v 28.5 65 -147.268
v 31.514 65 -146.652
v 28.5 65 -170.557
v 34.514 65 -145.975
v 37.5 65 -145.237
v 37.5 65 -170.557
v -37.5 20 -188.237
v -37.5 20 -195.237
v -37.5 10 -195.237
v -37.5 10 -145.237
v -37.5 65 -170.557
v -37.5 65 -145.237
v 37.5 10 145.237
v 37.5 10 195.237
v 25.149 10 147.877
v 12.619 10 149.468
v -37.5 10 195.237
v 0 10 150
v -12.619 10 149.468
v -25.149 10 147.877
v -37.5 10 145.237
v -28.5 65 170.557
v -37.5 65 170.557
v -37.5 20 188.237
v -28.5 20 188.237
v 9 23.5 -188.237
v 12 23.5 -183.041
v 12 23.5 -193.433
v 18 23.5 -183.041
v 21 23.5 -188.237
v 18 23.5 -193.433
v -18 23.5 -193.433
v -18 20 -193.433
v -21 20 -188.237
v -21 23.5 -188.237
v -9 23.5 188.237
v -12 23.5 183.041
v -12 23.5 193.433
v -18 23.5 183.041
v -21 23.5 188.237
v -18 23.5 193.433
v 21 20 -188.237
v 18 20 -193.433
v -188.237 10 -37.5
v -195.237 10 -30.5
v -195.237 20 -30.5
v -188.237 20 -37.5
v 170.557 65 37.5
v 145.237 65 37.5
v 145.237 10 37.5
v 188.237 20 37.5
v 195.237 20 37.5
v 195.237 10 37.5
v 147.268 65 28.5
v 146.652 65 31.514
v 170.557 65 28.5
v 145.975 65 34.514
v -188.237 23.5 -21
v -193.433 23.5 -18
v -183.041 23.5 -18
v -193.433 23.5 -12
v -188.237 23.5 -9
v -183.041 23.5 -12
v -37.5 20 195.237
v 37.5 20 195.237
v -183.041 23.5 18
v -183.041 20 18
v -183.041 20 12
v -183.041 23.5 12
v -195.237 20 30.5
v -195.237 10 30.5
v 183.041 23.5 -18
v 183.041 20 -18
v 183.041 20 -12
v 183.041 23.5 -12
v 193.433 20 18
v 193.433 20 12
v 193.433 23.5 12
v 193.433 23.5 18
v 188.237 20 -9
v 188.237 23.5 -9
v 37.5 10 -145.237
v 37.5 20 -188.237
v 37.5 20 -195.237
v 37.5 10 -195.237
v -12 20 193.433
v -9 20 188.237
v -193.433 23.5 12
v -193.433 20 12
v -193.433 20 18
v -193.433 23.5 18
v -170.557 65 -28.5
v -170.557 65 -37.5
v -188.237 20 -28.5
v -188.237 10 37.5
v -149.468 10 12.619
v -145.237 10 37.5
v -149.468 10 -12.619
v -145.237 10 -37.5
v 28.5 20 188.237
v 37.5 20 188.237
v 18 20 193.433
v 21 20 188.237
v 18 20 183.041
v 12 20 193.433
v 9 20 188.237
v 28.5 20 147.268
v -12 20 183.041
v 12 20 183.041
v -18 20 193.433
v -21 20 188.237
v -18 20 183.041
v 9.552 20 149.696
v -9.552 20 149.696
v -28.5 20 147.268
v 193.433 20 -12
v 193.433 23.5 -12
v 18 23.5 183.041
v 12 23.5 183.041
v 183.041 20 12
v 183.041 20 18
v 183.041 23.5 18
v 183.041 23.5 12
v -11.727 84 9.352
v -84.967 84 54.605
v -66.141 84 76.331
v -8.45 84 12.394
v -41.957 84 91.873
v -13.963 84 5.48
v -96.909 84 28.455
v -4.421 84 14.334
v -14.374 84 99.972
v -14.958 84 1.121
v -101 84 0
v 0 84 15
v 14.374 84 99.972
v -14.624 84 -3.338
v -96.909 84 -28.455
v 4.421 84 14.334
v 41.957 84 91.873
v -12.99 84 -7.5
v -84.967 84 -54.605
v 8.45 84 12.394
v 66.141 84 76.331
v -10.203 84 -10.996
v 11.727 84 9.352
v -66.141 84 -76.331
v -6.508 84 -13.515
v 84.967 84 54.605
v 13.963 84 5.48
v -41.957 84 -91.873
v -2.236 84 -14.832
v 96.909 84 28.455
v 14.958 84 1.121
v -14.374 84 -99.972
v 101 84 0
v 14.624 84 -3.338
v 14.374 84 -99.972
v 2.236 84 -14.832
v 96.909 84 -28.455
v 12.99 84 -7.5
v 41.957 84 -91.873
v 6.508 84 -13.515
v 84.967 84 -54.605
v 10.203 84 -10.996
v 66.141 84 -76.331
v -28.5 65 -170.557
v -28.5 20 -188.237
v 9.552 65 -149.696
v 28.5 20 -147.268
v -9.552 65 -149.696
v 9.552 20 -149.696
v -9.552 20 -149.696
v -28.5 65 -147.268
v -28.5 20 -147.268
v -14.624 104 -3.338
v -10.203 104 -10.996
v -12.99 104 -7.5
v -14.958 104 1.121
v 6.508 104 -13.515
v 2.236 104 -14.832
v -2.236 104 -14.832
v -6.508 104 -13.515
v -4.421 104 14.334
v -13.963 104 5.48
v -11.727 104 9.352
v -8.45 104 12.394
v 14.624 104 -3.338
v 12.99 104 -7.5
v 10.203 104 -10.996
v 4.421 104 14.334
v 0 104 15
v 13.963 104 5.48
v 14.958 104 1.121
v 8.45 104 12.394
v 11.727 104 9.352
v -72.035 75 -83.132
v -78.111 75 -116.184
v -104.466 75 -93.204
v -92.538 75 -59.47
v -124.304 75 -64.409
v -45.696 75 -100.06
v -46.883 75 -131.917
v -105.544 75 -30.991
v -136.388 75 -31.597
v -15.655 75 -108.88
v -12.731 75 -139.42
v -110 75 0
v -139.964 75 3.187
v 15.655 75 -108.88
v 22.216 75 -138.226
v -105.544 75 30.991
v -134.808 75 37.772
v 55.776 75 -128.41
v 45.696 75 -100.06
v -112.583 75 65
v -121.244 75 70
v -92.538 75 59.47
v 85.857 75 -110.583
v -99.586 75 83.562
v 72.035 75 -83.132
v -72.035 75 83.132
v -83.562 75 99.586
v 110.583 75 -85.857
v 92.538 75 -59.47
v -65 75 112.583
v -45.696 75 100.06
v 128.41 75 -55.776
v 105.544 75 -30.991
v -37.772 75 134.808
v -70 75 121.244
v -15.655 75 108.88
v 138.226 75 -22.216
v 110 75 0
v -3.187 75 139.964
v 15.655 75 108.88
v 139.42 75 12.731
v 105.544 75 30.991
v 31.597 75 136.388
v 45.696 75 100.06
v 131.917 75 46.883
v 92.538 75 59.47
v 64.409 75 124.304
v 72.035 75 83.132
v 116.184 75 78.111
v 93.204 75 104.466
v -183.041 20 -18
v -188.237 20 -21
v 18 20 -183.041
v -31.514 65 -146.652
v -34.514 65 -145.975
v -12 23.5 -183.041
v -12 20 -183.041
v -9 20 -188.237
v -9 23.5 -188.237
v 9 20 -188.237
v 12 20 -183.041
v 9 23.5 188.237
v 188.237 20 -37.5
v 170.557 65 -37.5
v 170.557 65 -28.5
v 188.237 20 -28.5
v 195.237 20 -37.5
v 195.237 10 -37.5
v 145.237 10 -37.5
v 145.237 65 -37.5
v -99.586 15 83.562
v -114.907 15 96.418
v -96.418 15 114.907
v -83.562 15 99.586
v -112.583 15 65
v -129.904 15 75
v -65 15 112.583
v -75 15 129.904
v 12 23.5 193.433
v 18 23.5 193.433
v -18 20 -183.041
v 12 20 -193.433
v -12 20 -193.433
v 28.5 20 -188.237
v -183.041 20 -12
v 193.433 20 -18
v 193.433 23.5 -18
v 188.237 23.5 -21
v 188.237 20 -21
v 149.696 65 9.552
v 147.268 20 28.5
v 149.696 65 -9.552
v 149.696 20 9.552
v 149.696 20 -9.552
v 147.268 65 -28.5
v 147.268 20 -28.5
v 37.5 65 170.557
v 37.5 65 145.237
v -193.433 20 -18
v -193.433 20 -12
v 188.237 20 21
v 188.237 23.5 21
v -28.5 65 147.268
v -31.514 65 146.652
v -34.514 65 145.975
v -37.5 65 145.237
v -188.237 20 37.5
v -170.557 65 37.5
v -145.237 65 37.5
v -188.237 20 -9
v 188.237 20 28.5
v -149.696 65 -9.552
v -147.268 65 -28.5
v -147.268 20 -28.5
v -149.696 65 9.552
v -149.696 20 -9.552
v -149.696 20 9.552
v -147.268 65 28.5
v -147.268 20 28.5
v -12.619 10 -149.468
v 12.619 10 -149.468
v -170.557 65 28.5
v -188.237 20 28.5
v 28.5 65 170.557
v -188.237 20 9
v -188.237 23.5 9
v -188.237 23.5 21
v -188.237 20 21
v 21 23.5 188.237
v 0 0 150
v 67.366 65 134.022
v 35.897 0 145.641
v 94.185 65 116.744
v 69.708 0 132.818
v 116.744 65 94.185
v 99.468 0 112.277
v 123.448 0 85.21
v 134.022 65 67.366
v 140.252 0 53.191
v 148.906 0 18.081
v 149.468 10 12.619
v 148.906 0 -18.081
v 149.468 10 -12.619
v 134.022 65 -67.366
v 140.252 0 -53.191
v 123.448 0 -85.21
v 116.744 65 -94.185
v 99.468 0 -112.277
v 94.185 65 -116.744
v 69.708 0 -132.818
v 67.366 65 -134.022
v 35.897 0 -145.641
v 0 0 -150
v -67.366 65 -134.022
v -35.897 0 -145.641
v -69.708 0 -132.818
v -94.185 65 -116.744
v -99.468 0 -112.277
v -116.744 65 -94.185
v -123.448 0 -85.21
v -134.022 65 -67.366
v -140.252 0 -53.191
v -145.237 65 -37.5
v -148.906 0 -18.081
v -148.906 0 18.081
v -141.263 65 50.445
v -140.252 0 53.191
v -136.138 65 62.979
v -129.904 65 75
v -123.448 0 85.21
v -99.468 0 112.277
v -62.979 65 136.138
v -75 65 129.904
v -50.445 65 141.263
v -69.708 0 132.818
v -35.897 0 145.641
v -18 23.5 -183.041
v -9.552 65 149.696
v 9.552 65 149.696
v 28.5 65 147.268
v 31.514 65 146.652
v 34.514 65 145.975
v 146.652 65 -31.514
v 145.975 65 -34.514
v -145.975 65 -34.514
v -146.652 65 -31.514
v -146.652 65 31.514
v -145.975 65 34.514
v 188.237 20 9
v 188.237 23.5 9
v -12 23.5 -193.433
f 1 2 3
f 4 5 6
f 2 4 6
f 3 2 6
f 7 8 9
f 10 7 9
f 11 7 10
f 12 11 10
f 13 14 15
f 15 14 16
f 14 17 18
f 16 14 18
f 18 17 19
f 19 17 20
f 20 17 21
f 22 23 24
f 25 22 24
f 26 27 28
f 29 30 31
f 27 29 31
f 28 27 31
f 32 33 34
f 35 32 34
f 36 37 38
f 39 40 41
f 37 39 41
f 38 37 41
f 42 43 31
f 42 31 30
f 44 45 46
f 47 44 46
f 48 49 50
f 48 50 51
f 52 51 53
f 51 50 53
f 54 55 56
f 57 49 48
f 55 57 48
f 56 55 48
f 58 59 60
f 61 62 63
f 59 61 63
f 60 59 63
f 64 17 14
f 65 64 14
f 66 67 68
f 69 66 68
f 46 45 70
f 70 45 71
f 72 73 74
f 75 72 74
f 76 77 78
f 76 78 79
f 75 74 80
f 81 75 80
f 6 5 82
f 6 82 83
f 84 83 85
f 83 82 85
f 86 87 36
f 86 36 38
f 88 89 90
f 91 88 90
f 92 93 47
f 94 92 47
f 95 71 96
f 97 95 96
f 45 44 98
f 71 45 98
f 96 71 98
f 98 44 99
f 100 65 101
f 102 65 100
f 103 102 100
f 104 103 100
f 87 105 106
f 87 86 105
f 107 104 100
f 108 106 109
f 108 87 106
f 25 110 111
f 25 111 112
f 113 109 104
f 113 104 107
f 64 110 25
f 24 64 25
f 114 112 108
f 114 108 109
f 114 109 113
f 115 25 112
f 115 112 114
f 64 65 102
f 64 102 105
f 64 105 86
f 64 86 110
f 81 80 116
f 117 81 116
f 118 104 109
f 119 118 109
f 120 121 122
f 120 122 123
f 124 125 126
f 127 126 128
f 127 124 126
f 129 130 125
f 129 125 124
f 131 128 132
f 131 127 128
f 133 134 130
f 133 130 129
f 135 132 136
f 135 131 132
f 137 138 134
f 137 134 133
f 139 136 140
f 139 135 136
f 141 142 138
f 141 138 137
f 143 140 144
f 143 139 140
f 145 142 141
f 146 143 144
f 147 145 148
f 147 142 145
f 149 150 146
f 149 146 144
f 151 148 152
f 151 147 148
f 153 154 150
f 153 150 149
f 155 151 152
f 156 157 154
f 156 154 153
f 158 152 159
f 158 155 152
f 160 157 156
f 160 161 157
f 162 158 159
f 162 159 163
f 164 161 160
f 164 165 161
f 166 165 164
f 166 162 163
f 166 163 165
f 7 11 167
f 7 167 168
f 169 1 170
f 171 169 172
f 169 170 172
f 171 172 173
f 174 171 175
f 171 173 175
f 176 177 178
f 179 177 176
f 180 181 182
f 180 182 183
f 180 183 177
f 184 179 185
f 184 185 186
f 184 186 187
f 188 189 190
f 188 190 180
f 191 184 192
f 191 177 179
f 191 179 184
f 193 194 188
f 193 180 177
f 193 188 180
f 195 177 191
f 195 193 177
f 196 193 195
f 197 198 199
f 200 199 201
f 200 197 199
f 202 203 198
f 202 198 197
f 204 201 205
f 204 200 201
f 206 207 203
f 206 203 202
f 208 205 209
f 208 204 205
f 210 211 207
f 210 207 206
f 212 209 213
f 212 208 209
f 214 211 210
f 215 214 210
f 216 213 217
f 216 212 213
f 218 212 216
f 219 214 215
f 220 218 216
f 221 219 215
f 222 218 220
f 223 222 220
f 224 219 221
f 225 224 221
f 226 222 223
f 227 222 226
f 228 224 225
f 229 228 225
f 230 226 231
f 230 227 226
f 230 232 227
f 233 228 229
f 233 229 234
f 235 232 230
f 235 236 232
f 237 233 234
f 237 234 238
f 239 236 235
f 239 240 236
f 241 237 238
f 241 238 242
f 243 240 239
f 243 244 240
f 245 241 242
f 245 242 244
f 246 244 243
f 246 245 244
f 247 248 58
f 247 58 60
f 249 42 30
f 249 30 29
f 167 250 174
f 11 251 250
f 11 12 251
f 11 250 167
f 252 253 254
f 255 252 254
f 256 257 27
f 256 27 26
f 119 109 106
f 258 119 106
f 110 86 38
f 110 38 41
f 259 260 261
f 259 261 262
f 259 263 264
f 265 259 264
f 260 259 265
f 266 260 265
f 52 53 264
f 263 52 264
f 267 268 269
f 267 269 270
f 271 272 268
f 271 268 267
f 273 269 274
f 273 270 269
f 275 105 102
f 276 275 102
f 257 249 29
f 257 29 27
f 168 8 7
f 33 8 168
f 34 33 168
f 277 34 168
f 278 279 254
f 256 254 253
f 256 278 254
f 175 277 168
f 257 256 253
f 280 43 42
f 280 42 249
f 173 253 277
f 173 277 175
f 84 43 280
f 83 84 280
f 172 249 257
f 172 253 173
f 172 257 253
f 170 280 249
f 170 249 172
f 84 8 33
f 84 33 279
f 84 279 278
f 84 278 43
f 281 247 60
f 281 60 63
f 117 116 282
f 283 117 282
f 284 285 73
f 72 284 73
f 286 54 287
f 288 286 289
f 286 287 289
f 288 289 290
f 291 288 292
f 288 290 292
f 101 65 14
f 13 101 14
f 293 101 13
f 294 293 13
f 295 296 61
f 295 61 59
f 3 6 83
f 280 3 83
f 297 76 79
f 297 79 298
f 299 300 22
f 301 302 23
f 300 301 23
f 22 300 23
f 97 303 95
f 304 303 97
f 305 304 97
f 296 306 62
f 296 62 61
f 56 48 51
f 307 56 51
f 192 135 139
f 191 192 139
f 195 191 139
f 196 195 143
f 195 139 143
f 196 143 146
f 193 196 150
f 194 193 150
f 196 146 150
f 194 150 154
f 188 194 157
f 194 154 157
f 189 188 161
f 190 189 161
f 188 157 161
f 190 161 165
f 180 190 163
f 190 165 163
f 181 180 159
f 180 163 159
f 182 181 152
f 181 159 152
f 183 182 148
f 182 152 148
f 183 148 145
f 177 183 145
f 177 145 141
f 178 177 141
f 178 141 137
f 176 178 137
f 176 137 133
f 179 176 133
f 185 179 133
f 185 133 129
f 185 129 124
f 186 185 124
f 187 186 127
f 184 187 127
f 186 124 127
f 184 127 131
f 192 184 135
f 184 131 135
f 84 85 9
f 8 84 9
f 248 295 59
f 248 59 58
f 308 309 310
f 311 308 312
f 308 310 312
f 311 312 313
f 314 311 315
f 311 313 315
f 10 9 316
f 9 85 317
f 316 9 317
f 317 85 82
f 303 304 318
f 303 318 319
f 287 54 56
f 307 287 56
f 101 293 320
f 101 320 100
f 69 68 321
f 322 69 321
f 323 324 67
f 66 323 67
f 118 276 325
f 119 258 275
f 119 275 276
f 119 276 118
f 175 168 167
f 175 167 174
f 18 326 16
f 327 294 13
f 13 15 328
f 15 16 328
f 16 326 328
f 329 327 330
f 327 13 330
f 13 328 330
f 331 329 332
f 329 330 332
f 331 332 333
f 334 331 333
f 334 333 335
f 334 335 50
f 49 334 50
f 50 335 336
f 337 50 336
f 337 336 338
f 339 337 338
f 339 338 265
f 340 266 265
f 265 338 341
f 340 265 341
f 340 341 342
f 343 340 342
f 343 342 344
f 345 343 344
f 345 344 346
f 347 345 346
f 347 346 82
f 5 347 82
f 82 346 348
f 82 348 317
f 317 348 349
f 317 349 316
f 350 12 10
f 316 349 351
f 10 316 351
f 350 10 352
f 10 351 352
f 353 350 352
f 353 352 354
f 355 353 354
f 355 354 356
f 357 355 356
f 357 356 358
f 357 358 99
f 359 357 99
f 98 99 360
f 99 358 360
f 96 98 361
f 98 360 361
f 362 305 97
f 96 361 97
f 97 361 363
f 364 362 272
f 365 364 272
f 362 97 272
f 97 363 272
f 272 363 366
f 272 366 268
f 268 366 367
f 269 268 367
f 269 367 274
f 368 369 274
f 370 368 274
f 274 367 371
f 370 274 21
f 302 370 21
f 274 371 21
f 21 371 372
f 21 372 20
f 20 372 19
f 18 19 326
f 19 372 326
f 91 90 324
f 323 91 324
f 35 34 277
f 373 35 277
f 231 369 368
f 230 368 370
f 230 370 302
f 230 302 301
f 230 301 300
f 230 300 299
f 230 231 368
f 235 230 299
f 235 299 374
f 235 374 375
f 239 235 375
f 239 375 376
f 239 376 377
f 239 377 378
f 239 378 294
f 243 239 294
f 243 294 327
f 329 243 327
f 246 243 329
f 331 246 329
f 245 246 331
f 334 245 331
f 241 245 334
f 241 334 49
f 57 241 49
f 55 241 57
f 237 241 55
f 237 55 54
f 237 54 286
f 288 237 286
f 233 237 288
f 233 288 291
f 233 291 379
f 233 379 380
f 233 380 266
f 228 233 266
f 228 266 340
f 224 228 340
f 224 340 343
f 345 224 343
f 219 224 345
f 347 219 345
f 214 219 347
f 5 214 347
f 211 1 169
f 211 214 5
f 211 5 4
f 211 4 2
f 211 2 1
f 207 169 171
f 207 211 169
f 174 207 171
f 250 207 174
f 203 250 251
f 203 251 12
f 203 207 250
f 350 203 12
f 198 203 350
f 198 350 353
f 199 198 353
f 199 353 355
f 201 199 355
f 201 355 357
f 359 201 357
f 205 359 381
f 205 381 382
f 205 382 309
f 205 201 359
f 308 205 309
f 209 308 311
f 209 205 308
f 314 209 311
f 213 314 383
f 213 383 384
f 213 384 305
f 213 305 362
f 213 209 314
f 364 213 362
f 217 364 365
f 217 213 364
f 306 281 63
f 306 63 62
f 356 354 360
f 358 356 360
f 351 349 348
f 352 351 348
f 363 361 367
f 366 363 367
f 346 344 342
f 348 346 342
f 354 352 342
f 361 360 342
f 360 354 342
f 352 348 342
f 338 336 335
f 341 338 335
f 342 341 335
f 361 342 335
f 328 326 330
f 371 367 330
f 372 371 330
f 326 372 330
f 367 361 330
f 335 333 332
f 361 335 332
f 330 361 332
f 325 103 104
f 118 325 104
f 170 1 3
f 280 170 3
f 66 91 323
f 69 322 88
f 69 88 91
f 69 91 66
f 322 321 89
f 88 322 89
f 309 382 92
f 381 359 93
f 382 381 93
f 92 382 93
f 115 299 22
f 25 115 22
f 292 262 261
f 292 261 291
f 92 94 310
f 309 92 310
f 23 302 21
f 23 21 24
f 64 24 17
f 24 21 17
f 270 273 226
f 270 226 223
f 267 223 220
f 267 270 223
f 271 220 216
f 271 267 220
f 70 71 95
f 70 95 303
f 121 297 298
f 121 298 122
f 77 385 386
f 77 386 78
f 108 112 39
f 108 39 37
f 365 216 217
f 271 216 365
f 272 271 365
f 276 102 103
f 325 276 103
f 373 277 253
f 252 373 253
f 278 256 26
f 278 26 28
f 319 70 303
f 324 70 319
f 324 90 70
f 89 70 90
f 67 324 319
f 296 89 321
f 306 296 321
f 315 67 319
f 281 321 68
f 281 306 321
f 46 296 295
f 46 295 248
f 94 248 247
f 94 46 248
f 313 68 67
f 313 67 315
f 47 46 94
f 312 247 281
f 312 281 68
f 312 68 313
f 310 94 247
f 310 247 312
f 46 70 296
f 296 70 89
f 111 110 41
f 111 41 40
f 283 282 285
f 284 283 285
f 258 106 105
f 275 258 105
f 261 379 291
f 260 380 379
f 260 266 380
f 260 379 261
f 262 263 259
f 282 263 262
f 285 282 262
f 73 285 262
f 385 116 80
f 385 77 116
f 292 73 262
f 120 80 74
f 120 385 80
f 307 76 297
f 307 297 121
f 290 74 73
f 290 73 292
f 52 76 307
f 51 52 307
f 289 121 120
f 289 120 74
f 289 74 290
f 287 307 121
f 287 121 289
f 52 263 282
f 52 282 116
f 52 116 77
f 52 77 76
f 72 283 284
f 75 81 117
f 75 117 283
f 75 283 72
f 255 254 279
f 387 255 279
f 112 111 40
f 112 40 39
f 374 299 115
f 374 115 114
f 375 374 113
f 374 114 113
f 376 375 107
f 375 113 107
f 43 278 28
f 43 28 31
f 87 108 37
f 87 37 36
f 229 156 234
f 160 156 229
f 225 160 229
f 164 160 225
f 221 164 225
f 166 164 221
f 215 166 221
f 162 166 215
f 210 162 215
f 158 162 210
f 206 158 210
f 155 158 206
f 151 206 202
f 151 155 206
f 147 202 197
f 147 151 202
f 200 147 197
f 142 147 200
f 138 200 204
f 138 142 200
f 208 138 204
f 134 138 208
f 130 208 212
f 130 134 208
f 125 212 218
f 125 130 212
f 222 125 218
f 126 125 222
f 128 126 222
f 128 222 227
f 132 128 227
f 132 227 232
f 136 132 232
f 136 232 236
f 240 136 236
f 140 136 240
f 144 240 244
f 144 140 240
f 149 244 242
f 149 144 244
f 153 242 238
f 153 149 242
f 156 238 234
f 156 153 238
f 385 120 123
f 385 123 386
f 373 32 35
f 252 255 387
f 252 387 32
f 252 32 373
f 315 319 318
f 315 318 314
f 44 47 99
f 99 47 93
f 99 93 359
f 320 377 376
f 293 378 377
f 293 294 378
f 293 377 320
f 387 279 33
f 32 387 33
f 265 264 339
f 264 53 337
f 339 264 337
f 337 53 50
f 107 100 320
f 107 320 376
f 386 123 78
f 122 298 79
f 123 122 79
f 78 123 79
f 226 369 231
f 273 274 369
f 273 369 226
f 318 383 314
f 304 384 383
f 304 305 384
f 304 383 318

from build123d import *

# Parameters (mm, degrees)
SKETCH1_R                = 150
BOSS_EXTRUDE1_DEPTH      = 75
CHAMFER1_SIZE            = 10
BOSS_EXTRUDE2_START      = -65
BOSS_EXTRUDE2_DEPTH      = 10
CHAMFER2_SIZE            = 7
BOSS_EXTRUDE3_DEPTH      = 9
BOSS_EXTRUDE4_DEPTH      = 3.5
CIRPATTERN1_COUNT        = 4
CIRPATTERN1_COPY_1_DEPTH = 9
CIRPATTERN1_COPY_2_DEPTH = 9
CIRPATTERN1_COPY_3_DEPTH = 9
CIRPATTERN1_COPY_4_DEPTH = 3.5
CIRPATTERN1_COPY_5_DEPTH = 3.5
CIRPATTERN1_COPY_6_DEPTH = 3.5
CUT_EXTRUDE1_START       = -60
CUT_EXTRUDE1_DEPTH       = 60
SKETCH6_R                = 110
BOSS_EXTRUDE5_DEPTH      = 9
BOSS_EXTRUDE5_TAPER      = 45
SKETCH7_R                = 15
BOSS_EXTRUDE6_DEPTH      = 20


with BuildPart() as part:
    # Sketch1 → Boss-Extrude1 (new body)
    with BuildSketch(Plane(origin=(0, 0, 0), x_dir=(1, 0, 0), z_dir=(0, 1, 0))):
        with Locations(Location((0, 0, 0), (0, 0, 270))):
            Circle(SKETCH1_R)
    extrude(amount=BOSS_EXTRUDE1_DEPTH)

    # Chamfer1
    chamfer1_edges = [part.edges().sort_by_distance(p)[0] for p in [
        (0, 75, -150),
    ]]
    chamfer(chamfer1_edges, length=CHAMFER1_SIZE)

    # Sketch2 → Boss-Extrude2 (add)
    with BuildSketch(Plane(origin=(0, 75, 0), x_dir=(1, 0, 0), z_dir=(0, 1, 0)).offset(BOSS_EXTRUDE2_START)):
        with BuildLine():
            Line((-145.236875483, 37.5), (-195.236875483, 37.5))
            Line((-195.236875483, 37.5), (-195.236875483, -37.5))
            Line((-195.236875483, -37.5), (-145.236875483, -37.5))
            ThreePointArc((-145.236875483, -37.5), (-150, 0), (-145.236875483, 37.5))
        make_face()
    boss_extrude2 = extrude(amount=BOSS_EXTRUDE2_DEPTH)

    # Chamfer2
    chamfer2_edges = [part.edges().sort_by_distance(p)[0] for p in [
        (-195.236875483, 15, -37.5),
        (-195.236875483, 15, 37.5),
    ]]
    chamfer(chamfer2_edges, length=CHAMFER2_SIZE)

    # Sketch3 → Boss-Extrude3 (add)
    with BuildSketch(Plane.XY.offset(37.5)):
        Polygon((-145.236875483, 20), (-145.236875483, 65), (-170.556875483, 65), (-188.236875483, 20), align=None)
    boss_extrude3 = extrude(amount=-BOSS_EXTRUDE3_DEPTH)

    # Sketch4 → Boss-Extrude4 (add)
    with BuildSketch(Plane(origin=(0, 20, 0), x_dir=(1, 0, 0), z_dir=(0, 1, 0))):
        Polygon((-183.04072306, -12), (-188.236875483, -9), (-193.433027905, -12), (-193.433027905, -18), (-188.236875483, -21), (-183.04072306, -18), align=None)
    boss_extrude4 = extrude(amount=BOSS_EXTRUDE4_DEPTH)

    # Mirror1: Boss-Extrude3, Boss-Extrude4 across plane
    add(boss_extrude3.mirror(Plane.XY))
    add(boss_extrude4.mirror(Plane.XY))

    # CirPattern1: Boss-Extrude2, Boss-Extrude3, Boss-Extrude4 ×4 about axis
    cirpattern1_axis = Axis((0, 0, 0), (0, 1, 0))
    add([boss_extrude2.rotate(cirpattern1_axis, i * 360 / CIRPATTERN1_COUNT) for i in range(1, CIRPATTERN1_COUNT)])
    add([boss_extrude3.rotate(cirpattern1_axis, i * 360 / CIRPATTERN1_COUNT) for i in range(1, CIRPATTERN1_COUNT)])
    add([boss_extrude4.rotate(cirpattern1_axis, i * 360 / CIRPATTERN1_COUNT) for i in range(1, CIRPATTERN1_COUNT)])

    # CirPattern1 copy 1 sketch → CirPattern1 copy 1 (add)
    with BuildSketch(Plane(origin=(-37.5, 0, 0), x_dir=(0, 0, -1), z_dir=(-1, 0, 0))):
        Polygon((-145.236875483, -20), (-145.236875483, -65), (-170.556875483, -65), (-188.236875483, -20), align=None)
    extrude(amount=-CIRPATTERN1_COPY_1_DEPTH)

    # CirPattern1 copy 2 sketch → CirPattern1 copy 2 (add)
    with BuildSketch(Plane(origin=(0, 0, 37.5), x_dir=(-1, 0, 0), z_dir=(0, 0, 1))):
        Polygon((-145.236875483, -20), (-145.236875483, -65), (-170.556875483, -65), (-188.236875483, -20), align=None)
    extrude(amount=-CIRPATTERN1_COPY_2_DEPTH)

    # CirPattern1 copy 3 sketch → CirPattern1 copy 3 (add)
    with BuildSketch(Plane(origin=(37.5, 0, 0), x_dir=(0, 0, 1), z_dir=(1, 0, 0))):
        Polygon((-145.236875483, -20), (-145.236875483, -65), (-170.556875483, -65), (-188.236875483, -20), align=None)
    extrude(amount=-CIRPATTERN1_COPY_3_DEPTH)

    # CirPattern1 copy 4 sketch → CirPattern1 copy 4 (add)
    with BuildSketch(Plane(origin=(0, 20, 0), x_dir=(0, 0, -1), z_dir=(0, 1, 0))):
        Polygon((-183.04072306, 12), (-188.236875483, 9), (-193.433027905, 12), (-193.433027905, 18), (-188.236875483, 21), (-183.04072306, 18), align=None)
    extrude(amount=CIRPATTERN1_COPY_4_DEPTH)

    # CirPattern1 copy 5 sketch → CirPattern1 copy 5 (add)
    with BuildSketch(Plane(origin=(0, 20, 0), x_dir=(-1, 0, 0), z_dir=(0, 1, 0))):
        Polygon((-183.04072306, 12), (-188.236875483, 9), (-193.433027905, 12), (-193.433027905, 18), (-188.236875483, 21), (-183.04072306, 18), align=None)
    extrude(amount=CIRPATTERN1_COPY_5_DEPTH)

    # CirPattern1 copy 6 sketch → CirPattern1 copy 6 (add)
    with BuildSketch(Plane.ZX.offset(20)):
        Polygon((-183.04072306, 12), (-188.236875483, 9), (-193.433027905, 12), (-193.433027905, 18), (-188.236875483, 21), (-183.04072306, 18), align=None)
    extrude(amount=CIRPATTERN1_COPY_6_DEPTH)

    # Sketch5 → Cut-Extrude1 (cut)
    with BuildSketch(Plane(origin=(0, 75, 0), x_dir=(1, 0, 0), z_dir=(0, 1, 0)).offset(CUT_EXTRUDE1_START)):
        with BuildLine():
            Line((-112.583302492, -65), (-129.903810568, -75))
            ThreePointArc((-129.903810568, -75), (-106.066017178, -106.066017178), (-75, -129.903810568))
            Line((-75, -129.903810568), (-65, -112.583302492))
            ThreePointArc((-65, -112.583302492), (-91.923881554, -91.923881554), (-112.583302492, -65))
        make_face()
    extrude(amount=CUT_EXTRUDE1_DEPTH, mode=Mode.SUBTRACT)

    # Sketch6 → Boss-Extrude5 (add)
    with BuildSketch(Plane(origin=(0, 75, 0), x_dir=(1, 0, 0), z_dir=(0, 1, 0))):
        Circle(SKETCH6_R)
    extrude(amount=BOSS_EXTRUDE5_DEPTH, taper=BOSS_EXTRUDE5_TAPER)

    # Sketch7 → Boss-Extrude6 (add)
    with BuildSketch(Plane(origin=(0, 84, 0), x_dir=(1, 0, 0), z_dir=(0, 1, 0))):
        with Locations(Location((0, 0, 0), (0, 0, 270))):
            Circle(SKETCH7_R)
    extrude(amount=BOSS_EXTRUDE6_DEPTH)


solid = part.part
